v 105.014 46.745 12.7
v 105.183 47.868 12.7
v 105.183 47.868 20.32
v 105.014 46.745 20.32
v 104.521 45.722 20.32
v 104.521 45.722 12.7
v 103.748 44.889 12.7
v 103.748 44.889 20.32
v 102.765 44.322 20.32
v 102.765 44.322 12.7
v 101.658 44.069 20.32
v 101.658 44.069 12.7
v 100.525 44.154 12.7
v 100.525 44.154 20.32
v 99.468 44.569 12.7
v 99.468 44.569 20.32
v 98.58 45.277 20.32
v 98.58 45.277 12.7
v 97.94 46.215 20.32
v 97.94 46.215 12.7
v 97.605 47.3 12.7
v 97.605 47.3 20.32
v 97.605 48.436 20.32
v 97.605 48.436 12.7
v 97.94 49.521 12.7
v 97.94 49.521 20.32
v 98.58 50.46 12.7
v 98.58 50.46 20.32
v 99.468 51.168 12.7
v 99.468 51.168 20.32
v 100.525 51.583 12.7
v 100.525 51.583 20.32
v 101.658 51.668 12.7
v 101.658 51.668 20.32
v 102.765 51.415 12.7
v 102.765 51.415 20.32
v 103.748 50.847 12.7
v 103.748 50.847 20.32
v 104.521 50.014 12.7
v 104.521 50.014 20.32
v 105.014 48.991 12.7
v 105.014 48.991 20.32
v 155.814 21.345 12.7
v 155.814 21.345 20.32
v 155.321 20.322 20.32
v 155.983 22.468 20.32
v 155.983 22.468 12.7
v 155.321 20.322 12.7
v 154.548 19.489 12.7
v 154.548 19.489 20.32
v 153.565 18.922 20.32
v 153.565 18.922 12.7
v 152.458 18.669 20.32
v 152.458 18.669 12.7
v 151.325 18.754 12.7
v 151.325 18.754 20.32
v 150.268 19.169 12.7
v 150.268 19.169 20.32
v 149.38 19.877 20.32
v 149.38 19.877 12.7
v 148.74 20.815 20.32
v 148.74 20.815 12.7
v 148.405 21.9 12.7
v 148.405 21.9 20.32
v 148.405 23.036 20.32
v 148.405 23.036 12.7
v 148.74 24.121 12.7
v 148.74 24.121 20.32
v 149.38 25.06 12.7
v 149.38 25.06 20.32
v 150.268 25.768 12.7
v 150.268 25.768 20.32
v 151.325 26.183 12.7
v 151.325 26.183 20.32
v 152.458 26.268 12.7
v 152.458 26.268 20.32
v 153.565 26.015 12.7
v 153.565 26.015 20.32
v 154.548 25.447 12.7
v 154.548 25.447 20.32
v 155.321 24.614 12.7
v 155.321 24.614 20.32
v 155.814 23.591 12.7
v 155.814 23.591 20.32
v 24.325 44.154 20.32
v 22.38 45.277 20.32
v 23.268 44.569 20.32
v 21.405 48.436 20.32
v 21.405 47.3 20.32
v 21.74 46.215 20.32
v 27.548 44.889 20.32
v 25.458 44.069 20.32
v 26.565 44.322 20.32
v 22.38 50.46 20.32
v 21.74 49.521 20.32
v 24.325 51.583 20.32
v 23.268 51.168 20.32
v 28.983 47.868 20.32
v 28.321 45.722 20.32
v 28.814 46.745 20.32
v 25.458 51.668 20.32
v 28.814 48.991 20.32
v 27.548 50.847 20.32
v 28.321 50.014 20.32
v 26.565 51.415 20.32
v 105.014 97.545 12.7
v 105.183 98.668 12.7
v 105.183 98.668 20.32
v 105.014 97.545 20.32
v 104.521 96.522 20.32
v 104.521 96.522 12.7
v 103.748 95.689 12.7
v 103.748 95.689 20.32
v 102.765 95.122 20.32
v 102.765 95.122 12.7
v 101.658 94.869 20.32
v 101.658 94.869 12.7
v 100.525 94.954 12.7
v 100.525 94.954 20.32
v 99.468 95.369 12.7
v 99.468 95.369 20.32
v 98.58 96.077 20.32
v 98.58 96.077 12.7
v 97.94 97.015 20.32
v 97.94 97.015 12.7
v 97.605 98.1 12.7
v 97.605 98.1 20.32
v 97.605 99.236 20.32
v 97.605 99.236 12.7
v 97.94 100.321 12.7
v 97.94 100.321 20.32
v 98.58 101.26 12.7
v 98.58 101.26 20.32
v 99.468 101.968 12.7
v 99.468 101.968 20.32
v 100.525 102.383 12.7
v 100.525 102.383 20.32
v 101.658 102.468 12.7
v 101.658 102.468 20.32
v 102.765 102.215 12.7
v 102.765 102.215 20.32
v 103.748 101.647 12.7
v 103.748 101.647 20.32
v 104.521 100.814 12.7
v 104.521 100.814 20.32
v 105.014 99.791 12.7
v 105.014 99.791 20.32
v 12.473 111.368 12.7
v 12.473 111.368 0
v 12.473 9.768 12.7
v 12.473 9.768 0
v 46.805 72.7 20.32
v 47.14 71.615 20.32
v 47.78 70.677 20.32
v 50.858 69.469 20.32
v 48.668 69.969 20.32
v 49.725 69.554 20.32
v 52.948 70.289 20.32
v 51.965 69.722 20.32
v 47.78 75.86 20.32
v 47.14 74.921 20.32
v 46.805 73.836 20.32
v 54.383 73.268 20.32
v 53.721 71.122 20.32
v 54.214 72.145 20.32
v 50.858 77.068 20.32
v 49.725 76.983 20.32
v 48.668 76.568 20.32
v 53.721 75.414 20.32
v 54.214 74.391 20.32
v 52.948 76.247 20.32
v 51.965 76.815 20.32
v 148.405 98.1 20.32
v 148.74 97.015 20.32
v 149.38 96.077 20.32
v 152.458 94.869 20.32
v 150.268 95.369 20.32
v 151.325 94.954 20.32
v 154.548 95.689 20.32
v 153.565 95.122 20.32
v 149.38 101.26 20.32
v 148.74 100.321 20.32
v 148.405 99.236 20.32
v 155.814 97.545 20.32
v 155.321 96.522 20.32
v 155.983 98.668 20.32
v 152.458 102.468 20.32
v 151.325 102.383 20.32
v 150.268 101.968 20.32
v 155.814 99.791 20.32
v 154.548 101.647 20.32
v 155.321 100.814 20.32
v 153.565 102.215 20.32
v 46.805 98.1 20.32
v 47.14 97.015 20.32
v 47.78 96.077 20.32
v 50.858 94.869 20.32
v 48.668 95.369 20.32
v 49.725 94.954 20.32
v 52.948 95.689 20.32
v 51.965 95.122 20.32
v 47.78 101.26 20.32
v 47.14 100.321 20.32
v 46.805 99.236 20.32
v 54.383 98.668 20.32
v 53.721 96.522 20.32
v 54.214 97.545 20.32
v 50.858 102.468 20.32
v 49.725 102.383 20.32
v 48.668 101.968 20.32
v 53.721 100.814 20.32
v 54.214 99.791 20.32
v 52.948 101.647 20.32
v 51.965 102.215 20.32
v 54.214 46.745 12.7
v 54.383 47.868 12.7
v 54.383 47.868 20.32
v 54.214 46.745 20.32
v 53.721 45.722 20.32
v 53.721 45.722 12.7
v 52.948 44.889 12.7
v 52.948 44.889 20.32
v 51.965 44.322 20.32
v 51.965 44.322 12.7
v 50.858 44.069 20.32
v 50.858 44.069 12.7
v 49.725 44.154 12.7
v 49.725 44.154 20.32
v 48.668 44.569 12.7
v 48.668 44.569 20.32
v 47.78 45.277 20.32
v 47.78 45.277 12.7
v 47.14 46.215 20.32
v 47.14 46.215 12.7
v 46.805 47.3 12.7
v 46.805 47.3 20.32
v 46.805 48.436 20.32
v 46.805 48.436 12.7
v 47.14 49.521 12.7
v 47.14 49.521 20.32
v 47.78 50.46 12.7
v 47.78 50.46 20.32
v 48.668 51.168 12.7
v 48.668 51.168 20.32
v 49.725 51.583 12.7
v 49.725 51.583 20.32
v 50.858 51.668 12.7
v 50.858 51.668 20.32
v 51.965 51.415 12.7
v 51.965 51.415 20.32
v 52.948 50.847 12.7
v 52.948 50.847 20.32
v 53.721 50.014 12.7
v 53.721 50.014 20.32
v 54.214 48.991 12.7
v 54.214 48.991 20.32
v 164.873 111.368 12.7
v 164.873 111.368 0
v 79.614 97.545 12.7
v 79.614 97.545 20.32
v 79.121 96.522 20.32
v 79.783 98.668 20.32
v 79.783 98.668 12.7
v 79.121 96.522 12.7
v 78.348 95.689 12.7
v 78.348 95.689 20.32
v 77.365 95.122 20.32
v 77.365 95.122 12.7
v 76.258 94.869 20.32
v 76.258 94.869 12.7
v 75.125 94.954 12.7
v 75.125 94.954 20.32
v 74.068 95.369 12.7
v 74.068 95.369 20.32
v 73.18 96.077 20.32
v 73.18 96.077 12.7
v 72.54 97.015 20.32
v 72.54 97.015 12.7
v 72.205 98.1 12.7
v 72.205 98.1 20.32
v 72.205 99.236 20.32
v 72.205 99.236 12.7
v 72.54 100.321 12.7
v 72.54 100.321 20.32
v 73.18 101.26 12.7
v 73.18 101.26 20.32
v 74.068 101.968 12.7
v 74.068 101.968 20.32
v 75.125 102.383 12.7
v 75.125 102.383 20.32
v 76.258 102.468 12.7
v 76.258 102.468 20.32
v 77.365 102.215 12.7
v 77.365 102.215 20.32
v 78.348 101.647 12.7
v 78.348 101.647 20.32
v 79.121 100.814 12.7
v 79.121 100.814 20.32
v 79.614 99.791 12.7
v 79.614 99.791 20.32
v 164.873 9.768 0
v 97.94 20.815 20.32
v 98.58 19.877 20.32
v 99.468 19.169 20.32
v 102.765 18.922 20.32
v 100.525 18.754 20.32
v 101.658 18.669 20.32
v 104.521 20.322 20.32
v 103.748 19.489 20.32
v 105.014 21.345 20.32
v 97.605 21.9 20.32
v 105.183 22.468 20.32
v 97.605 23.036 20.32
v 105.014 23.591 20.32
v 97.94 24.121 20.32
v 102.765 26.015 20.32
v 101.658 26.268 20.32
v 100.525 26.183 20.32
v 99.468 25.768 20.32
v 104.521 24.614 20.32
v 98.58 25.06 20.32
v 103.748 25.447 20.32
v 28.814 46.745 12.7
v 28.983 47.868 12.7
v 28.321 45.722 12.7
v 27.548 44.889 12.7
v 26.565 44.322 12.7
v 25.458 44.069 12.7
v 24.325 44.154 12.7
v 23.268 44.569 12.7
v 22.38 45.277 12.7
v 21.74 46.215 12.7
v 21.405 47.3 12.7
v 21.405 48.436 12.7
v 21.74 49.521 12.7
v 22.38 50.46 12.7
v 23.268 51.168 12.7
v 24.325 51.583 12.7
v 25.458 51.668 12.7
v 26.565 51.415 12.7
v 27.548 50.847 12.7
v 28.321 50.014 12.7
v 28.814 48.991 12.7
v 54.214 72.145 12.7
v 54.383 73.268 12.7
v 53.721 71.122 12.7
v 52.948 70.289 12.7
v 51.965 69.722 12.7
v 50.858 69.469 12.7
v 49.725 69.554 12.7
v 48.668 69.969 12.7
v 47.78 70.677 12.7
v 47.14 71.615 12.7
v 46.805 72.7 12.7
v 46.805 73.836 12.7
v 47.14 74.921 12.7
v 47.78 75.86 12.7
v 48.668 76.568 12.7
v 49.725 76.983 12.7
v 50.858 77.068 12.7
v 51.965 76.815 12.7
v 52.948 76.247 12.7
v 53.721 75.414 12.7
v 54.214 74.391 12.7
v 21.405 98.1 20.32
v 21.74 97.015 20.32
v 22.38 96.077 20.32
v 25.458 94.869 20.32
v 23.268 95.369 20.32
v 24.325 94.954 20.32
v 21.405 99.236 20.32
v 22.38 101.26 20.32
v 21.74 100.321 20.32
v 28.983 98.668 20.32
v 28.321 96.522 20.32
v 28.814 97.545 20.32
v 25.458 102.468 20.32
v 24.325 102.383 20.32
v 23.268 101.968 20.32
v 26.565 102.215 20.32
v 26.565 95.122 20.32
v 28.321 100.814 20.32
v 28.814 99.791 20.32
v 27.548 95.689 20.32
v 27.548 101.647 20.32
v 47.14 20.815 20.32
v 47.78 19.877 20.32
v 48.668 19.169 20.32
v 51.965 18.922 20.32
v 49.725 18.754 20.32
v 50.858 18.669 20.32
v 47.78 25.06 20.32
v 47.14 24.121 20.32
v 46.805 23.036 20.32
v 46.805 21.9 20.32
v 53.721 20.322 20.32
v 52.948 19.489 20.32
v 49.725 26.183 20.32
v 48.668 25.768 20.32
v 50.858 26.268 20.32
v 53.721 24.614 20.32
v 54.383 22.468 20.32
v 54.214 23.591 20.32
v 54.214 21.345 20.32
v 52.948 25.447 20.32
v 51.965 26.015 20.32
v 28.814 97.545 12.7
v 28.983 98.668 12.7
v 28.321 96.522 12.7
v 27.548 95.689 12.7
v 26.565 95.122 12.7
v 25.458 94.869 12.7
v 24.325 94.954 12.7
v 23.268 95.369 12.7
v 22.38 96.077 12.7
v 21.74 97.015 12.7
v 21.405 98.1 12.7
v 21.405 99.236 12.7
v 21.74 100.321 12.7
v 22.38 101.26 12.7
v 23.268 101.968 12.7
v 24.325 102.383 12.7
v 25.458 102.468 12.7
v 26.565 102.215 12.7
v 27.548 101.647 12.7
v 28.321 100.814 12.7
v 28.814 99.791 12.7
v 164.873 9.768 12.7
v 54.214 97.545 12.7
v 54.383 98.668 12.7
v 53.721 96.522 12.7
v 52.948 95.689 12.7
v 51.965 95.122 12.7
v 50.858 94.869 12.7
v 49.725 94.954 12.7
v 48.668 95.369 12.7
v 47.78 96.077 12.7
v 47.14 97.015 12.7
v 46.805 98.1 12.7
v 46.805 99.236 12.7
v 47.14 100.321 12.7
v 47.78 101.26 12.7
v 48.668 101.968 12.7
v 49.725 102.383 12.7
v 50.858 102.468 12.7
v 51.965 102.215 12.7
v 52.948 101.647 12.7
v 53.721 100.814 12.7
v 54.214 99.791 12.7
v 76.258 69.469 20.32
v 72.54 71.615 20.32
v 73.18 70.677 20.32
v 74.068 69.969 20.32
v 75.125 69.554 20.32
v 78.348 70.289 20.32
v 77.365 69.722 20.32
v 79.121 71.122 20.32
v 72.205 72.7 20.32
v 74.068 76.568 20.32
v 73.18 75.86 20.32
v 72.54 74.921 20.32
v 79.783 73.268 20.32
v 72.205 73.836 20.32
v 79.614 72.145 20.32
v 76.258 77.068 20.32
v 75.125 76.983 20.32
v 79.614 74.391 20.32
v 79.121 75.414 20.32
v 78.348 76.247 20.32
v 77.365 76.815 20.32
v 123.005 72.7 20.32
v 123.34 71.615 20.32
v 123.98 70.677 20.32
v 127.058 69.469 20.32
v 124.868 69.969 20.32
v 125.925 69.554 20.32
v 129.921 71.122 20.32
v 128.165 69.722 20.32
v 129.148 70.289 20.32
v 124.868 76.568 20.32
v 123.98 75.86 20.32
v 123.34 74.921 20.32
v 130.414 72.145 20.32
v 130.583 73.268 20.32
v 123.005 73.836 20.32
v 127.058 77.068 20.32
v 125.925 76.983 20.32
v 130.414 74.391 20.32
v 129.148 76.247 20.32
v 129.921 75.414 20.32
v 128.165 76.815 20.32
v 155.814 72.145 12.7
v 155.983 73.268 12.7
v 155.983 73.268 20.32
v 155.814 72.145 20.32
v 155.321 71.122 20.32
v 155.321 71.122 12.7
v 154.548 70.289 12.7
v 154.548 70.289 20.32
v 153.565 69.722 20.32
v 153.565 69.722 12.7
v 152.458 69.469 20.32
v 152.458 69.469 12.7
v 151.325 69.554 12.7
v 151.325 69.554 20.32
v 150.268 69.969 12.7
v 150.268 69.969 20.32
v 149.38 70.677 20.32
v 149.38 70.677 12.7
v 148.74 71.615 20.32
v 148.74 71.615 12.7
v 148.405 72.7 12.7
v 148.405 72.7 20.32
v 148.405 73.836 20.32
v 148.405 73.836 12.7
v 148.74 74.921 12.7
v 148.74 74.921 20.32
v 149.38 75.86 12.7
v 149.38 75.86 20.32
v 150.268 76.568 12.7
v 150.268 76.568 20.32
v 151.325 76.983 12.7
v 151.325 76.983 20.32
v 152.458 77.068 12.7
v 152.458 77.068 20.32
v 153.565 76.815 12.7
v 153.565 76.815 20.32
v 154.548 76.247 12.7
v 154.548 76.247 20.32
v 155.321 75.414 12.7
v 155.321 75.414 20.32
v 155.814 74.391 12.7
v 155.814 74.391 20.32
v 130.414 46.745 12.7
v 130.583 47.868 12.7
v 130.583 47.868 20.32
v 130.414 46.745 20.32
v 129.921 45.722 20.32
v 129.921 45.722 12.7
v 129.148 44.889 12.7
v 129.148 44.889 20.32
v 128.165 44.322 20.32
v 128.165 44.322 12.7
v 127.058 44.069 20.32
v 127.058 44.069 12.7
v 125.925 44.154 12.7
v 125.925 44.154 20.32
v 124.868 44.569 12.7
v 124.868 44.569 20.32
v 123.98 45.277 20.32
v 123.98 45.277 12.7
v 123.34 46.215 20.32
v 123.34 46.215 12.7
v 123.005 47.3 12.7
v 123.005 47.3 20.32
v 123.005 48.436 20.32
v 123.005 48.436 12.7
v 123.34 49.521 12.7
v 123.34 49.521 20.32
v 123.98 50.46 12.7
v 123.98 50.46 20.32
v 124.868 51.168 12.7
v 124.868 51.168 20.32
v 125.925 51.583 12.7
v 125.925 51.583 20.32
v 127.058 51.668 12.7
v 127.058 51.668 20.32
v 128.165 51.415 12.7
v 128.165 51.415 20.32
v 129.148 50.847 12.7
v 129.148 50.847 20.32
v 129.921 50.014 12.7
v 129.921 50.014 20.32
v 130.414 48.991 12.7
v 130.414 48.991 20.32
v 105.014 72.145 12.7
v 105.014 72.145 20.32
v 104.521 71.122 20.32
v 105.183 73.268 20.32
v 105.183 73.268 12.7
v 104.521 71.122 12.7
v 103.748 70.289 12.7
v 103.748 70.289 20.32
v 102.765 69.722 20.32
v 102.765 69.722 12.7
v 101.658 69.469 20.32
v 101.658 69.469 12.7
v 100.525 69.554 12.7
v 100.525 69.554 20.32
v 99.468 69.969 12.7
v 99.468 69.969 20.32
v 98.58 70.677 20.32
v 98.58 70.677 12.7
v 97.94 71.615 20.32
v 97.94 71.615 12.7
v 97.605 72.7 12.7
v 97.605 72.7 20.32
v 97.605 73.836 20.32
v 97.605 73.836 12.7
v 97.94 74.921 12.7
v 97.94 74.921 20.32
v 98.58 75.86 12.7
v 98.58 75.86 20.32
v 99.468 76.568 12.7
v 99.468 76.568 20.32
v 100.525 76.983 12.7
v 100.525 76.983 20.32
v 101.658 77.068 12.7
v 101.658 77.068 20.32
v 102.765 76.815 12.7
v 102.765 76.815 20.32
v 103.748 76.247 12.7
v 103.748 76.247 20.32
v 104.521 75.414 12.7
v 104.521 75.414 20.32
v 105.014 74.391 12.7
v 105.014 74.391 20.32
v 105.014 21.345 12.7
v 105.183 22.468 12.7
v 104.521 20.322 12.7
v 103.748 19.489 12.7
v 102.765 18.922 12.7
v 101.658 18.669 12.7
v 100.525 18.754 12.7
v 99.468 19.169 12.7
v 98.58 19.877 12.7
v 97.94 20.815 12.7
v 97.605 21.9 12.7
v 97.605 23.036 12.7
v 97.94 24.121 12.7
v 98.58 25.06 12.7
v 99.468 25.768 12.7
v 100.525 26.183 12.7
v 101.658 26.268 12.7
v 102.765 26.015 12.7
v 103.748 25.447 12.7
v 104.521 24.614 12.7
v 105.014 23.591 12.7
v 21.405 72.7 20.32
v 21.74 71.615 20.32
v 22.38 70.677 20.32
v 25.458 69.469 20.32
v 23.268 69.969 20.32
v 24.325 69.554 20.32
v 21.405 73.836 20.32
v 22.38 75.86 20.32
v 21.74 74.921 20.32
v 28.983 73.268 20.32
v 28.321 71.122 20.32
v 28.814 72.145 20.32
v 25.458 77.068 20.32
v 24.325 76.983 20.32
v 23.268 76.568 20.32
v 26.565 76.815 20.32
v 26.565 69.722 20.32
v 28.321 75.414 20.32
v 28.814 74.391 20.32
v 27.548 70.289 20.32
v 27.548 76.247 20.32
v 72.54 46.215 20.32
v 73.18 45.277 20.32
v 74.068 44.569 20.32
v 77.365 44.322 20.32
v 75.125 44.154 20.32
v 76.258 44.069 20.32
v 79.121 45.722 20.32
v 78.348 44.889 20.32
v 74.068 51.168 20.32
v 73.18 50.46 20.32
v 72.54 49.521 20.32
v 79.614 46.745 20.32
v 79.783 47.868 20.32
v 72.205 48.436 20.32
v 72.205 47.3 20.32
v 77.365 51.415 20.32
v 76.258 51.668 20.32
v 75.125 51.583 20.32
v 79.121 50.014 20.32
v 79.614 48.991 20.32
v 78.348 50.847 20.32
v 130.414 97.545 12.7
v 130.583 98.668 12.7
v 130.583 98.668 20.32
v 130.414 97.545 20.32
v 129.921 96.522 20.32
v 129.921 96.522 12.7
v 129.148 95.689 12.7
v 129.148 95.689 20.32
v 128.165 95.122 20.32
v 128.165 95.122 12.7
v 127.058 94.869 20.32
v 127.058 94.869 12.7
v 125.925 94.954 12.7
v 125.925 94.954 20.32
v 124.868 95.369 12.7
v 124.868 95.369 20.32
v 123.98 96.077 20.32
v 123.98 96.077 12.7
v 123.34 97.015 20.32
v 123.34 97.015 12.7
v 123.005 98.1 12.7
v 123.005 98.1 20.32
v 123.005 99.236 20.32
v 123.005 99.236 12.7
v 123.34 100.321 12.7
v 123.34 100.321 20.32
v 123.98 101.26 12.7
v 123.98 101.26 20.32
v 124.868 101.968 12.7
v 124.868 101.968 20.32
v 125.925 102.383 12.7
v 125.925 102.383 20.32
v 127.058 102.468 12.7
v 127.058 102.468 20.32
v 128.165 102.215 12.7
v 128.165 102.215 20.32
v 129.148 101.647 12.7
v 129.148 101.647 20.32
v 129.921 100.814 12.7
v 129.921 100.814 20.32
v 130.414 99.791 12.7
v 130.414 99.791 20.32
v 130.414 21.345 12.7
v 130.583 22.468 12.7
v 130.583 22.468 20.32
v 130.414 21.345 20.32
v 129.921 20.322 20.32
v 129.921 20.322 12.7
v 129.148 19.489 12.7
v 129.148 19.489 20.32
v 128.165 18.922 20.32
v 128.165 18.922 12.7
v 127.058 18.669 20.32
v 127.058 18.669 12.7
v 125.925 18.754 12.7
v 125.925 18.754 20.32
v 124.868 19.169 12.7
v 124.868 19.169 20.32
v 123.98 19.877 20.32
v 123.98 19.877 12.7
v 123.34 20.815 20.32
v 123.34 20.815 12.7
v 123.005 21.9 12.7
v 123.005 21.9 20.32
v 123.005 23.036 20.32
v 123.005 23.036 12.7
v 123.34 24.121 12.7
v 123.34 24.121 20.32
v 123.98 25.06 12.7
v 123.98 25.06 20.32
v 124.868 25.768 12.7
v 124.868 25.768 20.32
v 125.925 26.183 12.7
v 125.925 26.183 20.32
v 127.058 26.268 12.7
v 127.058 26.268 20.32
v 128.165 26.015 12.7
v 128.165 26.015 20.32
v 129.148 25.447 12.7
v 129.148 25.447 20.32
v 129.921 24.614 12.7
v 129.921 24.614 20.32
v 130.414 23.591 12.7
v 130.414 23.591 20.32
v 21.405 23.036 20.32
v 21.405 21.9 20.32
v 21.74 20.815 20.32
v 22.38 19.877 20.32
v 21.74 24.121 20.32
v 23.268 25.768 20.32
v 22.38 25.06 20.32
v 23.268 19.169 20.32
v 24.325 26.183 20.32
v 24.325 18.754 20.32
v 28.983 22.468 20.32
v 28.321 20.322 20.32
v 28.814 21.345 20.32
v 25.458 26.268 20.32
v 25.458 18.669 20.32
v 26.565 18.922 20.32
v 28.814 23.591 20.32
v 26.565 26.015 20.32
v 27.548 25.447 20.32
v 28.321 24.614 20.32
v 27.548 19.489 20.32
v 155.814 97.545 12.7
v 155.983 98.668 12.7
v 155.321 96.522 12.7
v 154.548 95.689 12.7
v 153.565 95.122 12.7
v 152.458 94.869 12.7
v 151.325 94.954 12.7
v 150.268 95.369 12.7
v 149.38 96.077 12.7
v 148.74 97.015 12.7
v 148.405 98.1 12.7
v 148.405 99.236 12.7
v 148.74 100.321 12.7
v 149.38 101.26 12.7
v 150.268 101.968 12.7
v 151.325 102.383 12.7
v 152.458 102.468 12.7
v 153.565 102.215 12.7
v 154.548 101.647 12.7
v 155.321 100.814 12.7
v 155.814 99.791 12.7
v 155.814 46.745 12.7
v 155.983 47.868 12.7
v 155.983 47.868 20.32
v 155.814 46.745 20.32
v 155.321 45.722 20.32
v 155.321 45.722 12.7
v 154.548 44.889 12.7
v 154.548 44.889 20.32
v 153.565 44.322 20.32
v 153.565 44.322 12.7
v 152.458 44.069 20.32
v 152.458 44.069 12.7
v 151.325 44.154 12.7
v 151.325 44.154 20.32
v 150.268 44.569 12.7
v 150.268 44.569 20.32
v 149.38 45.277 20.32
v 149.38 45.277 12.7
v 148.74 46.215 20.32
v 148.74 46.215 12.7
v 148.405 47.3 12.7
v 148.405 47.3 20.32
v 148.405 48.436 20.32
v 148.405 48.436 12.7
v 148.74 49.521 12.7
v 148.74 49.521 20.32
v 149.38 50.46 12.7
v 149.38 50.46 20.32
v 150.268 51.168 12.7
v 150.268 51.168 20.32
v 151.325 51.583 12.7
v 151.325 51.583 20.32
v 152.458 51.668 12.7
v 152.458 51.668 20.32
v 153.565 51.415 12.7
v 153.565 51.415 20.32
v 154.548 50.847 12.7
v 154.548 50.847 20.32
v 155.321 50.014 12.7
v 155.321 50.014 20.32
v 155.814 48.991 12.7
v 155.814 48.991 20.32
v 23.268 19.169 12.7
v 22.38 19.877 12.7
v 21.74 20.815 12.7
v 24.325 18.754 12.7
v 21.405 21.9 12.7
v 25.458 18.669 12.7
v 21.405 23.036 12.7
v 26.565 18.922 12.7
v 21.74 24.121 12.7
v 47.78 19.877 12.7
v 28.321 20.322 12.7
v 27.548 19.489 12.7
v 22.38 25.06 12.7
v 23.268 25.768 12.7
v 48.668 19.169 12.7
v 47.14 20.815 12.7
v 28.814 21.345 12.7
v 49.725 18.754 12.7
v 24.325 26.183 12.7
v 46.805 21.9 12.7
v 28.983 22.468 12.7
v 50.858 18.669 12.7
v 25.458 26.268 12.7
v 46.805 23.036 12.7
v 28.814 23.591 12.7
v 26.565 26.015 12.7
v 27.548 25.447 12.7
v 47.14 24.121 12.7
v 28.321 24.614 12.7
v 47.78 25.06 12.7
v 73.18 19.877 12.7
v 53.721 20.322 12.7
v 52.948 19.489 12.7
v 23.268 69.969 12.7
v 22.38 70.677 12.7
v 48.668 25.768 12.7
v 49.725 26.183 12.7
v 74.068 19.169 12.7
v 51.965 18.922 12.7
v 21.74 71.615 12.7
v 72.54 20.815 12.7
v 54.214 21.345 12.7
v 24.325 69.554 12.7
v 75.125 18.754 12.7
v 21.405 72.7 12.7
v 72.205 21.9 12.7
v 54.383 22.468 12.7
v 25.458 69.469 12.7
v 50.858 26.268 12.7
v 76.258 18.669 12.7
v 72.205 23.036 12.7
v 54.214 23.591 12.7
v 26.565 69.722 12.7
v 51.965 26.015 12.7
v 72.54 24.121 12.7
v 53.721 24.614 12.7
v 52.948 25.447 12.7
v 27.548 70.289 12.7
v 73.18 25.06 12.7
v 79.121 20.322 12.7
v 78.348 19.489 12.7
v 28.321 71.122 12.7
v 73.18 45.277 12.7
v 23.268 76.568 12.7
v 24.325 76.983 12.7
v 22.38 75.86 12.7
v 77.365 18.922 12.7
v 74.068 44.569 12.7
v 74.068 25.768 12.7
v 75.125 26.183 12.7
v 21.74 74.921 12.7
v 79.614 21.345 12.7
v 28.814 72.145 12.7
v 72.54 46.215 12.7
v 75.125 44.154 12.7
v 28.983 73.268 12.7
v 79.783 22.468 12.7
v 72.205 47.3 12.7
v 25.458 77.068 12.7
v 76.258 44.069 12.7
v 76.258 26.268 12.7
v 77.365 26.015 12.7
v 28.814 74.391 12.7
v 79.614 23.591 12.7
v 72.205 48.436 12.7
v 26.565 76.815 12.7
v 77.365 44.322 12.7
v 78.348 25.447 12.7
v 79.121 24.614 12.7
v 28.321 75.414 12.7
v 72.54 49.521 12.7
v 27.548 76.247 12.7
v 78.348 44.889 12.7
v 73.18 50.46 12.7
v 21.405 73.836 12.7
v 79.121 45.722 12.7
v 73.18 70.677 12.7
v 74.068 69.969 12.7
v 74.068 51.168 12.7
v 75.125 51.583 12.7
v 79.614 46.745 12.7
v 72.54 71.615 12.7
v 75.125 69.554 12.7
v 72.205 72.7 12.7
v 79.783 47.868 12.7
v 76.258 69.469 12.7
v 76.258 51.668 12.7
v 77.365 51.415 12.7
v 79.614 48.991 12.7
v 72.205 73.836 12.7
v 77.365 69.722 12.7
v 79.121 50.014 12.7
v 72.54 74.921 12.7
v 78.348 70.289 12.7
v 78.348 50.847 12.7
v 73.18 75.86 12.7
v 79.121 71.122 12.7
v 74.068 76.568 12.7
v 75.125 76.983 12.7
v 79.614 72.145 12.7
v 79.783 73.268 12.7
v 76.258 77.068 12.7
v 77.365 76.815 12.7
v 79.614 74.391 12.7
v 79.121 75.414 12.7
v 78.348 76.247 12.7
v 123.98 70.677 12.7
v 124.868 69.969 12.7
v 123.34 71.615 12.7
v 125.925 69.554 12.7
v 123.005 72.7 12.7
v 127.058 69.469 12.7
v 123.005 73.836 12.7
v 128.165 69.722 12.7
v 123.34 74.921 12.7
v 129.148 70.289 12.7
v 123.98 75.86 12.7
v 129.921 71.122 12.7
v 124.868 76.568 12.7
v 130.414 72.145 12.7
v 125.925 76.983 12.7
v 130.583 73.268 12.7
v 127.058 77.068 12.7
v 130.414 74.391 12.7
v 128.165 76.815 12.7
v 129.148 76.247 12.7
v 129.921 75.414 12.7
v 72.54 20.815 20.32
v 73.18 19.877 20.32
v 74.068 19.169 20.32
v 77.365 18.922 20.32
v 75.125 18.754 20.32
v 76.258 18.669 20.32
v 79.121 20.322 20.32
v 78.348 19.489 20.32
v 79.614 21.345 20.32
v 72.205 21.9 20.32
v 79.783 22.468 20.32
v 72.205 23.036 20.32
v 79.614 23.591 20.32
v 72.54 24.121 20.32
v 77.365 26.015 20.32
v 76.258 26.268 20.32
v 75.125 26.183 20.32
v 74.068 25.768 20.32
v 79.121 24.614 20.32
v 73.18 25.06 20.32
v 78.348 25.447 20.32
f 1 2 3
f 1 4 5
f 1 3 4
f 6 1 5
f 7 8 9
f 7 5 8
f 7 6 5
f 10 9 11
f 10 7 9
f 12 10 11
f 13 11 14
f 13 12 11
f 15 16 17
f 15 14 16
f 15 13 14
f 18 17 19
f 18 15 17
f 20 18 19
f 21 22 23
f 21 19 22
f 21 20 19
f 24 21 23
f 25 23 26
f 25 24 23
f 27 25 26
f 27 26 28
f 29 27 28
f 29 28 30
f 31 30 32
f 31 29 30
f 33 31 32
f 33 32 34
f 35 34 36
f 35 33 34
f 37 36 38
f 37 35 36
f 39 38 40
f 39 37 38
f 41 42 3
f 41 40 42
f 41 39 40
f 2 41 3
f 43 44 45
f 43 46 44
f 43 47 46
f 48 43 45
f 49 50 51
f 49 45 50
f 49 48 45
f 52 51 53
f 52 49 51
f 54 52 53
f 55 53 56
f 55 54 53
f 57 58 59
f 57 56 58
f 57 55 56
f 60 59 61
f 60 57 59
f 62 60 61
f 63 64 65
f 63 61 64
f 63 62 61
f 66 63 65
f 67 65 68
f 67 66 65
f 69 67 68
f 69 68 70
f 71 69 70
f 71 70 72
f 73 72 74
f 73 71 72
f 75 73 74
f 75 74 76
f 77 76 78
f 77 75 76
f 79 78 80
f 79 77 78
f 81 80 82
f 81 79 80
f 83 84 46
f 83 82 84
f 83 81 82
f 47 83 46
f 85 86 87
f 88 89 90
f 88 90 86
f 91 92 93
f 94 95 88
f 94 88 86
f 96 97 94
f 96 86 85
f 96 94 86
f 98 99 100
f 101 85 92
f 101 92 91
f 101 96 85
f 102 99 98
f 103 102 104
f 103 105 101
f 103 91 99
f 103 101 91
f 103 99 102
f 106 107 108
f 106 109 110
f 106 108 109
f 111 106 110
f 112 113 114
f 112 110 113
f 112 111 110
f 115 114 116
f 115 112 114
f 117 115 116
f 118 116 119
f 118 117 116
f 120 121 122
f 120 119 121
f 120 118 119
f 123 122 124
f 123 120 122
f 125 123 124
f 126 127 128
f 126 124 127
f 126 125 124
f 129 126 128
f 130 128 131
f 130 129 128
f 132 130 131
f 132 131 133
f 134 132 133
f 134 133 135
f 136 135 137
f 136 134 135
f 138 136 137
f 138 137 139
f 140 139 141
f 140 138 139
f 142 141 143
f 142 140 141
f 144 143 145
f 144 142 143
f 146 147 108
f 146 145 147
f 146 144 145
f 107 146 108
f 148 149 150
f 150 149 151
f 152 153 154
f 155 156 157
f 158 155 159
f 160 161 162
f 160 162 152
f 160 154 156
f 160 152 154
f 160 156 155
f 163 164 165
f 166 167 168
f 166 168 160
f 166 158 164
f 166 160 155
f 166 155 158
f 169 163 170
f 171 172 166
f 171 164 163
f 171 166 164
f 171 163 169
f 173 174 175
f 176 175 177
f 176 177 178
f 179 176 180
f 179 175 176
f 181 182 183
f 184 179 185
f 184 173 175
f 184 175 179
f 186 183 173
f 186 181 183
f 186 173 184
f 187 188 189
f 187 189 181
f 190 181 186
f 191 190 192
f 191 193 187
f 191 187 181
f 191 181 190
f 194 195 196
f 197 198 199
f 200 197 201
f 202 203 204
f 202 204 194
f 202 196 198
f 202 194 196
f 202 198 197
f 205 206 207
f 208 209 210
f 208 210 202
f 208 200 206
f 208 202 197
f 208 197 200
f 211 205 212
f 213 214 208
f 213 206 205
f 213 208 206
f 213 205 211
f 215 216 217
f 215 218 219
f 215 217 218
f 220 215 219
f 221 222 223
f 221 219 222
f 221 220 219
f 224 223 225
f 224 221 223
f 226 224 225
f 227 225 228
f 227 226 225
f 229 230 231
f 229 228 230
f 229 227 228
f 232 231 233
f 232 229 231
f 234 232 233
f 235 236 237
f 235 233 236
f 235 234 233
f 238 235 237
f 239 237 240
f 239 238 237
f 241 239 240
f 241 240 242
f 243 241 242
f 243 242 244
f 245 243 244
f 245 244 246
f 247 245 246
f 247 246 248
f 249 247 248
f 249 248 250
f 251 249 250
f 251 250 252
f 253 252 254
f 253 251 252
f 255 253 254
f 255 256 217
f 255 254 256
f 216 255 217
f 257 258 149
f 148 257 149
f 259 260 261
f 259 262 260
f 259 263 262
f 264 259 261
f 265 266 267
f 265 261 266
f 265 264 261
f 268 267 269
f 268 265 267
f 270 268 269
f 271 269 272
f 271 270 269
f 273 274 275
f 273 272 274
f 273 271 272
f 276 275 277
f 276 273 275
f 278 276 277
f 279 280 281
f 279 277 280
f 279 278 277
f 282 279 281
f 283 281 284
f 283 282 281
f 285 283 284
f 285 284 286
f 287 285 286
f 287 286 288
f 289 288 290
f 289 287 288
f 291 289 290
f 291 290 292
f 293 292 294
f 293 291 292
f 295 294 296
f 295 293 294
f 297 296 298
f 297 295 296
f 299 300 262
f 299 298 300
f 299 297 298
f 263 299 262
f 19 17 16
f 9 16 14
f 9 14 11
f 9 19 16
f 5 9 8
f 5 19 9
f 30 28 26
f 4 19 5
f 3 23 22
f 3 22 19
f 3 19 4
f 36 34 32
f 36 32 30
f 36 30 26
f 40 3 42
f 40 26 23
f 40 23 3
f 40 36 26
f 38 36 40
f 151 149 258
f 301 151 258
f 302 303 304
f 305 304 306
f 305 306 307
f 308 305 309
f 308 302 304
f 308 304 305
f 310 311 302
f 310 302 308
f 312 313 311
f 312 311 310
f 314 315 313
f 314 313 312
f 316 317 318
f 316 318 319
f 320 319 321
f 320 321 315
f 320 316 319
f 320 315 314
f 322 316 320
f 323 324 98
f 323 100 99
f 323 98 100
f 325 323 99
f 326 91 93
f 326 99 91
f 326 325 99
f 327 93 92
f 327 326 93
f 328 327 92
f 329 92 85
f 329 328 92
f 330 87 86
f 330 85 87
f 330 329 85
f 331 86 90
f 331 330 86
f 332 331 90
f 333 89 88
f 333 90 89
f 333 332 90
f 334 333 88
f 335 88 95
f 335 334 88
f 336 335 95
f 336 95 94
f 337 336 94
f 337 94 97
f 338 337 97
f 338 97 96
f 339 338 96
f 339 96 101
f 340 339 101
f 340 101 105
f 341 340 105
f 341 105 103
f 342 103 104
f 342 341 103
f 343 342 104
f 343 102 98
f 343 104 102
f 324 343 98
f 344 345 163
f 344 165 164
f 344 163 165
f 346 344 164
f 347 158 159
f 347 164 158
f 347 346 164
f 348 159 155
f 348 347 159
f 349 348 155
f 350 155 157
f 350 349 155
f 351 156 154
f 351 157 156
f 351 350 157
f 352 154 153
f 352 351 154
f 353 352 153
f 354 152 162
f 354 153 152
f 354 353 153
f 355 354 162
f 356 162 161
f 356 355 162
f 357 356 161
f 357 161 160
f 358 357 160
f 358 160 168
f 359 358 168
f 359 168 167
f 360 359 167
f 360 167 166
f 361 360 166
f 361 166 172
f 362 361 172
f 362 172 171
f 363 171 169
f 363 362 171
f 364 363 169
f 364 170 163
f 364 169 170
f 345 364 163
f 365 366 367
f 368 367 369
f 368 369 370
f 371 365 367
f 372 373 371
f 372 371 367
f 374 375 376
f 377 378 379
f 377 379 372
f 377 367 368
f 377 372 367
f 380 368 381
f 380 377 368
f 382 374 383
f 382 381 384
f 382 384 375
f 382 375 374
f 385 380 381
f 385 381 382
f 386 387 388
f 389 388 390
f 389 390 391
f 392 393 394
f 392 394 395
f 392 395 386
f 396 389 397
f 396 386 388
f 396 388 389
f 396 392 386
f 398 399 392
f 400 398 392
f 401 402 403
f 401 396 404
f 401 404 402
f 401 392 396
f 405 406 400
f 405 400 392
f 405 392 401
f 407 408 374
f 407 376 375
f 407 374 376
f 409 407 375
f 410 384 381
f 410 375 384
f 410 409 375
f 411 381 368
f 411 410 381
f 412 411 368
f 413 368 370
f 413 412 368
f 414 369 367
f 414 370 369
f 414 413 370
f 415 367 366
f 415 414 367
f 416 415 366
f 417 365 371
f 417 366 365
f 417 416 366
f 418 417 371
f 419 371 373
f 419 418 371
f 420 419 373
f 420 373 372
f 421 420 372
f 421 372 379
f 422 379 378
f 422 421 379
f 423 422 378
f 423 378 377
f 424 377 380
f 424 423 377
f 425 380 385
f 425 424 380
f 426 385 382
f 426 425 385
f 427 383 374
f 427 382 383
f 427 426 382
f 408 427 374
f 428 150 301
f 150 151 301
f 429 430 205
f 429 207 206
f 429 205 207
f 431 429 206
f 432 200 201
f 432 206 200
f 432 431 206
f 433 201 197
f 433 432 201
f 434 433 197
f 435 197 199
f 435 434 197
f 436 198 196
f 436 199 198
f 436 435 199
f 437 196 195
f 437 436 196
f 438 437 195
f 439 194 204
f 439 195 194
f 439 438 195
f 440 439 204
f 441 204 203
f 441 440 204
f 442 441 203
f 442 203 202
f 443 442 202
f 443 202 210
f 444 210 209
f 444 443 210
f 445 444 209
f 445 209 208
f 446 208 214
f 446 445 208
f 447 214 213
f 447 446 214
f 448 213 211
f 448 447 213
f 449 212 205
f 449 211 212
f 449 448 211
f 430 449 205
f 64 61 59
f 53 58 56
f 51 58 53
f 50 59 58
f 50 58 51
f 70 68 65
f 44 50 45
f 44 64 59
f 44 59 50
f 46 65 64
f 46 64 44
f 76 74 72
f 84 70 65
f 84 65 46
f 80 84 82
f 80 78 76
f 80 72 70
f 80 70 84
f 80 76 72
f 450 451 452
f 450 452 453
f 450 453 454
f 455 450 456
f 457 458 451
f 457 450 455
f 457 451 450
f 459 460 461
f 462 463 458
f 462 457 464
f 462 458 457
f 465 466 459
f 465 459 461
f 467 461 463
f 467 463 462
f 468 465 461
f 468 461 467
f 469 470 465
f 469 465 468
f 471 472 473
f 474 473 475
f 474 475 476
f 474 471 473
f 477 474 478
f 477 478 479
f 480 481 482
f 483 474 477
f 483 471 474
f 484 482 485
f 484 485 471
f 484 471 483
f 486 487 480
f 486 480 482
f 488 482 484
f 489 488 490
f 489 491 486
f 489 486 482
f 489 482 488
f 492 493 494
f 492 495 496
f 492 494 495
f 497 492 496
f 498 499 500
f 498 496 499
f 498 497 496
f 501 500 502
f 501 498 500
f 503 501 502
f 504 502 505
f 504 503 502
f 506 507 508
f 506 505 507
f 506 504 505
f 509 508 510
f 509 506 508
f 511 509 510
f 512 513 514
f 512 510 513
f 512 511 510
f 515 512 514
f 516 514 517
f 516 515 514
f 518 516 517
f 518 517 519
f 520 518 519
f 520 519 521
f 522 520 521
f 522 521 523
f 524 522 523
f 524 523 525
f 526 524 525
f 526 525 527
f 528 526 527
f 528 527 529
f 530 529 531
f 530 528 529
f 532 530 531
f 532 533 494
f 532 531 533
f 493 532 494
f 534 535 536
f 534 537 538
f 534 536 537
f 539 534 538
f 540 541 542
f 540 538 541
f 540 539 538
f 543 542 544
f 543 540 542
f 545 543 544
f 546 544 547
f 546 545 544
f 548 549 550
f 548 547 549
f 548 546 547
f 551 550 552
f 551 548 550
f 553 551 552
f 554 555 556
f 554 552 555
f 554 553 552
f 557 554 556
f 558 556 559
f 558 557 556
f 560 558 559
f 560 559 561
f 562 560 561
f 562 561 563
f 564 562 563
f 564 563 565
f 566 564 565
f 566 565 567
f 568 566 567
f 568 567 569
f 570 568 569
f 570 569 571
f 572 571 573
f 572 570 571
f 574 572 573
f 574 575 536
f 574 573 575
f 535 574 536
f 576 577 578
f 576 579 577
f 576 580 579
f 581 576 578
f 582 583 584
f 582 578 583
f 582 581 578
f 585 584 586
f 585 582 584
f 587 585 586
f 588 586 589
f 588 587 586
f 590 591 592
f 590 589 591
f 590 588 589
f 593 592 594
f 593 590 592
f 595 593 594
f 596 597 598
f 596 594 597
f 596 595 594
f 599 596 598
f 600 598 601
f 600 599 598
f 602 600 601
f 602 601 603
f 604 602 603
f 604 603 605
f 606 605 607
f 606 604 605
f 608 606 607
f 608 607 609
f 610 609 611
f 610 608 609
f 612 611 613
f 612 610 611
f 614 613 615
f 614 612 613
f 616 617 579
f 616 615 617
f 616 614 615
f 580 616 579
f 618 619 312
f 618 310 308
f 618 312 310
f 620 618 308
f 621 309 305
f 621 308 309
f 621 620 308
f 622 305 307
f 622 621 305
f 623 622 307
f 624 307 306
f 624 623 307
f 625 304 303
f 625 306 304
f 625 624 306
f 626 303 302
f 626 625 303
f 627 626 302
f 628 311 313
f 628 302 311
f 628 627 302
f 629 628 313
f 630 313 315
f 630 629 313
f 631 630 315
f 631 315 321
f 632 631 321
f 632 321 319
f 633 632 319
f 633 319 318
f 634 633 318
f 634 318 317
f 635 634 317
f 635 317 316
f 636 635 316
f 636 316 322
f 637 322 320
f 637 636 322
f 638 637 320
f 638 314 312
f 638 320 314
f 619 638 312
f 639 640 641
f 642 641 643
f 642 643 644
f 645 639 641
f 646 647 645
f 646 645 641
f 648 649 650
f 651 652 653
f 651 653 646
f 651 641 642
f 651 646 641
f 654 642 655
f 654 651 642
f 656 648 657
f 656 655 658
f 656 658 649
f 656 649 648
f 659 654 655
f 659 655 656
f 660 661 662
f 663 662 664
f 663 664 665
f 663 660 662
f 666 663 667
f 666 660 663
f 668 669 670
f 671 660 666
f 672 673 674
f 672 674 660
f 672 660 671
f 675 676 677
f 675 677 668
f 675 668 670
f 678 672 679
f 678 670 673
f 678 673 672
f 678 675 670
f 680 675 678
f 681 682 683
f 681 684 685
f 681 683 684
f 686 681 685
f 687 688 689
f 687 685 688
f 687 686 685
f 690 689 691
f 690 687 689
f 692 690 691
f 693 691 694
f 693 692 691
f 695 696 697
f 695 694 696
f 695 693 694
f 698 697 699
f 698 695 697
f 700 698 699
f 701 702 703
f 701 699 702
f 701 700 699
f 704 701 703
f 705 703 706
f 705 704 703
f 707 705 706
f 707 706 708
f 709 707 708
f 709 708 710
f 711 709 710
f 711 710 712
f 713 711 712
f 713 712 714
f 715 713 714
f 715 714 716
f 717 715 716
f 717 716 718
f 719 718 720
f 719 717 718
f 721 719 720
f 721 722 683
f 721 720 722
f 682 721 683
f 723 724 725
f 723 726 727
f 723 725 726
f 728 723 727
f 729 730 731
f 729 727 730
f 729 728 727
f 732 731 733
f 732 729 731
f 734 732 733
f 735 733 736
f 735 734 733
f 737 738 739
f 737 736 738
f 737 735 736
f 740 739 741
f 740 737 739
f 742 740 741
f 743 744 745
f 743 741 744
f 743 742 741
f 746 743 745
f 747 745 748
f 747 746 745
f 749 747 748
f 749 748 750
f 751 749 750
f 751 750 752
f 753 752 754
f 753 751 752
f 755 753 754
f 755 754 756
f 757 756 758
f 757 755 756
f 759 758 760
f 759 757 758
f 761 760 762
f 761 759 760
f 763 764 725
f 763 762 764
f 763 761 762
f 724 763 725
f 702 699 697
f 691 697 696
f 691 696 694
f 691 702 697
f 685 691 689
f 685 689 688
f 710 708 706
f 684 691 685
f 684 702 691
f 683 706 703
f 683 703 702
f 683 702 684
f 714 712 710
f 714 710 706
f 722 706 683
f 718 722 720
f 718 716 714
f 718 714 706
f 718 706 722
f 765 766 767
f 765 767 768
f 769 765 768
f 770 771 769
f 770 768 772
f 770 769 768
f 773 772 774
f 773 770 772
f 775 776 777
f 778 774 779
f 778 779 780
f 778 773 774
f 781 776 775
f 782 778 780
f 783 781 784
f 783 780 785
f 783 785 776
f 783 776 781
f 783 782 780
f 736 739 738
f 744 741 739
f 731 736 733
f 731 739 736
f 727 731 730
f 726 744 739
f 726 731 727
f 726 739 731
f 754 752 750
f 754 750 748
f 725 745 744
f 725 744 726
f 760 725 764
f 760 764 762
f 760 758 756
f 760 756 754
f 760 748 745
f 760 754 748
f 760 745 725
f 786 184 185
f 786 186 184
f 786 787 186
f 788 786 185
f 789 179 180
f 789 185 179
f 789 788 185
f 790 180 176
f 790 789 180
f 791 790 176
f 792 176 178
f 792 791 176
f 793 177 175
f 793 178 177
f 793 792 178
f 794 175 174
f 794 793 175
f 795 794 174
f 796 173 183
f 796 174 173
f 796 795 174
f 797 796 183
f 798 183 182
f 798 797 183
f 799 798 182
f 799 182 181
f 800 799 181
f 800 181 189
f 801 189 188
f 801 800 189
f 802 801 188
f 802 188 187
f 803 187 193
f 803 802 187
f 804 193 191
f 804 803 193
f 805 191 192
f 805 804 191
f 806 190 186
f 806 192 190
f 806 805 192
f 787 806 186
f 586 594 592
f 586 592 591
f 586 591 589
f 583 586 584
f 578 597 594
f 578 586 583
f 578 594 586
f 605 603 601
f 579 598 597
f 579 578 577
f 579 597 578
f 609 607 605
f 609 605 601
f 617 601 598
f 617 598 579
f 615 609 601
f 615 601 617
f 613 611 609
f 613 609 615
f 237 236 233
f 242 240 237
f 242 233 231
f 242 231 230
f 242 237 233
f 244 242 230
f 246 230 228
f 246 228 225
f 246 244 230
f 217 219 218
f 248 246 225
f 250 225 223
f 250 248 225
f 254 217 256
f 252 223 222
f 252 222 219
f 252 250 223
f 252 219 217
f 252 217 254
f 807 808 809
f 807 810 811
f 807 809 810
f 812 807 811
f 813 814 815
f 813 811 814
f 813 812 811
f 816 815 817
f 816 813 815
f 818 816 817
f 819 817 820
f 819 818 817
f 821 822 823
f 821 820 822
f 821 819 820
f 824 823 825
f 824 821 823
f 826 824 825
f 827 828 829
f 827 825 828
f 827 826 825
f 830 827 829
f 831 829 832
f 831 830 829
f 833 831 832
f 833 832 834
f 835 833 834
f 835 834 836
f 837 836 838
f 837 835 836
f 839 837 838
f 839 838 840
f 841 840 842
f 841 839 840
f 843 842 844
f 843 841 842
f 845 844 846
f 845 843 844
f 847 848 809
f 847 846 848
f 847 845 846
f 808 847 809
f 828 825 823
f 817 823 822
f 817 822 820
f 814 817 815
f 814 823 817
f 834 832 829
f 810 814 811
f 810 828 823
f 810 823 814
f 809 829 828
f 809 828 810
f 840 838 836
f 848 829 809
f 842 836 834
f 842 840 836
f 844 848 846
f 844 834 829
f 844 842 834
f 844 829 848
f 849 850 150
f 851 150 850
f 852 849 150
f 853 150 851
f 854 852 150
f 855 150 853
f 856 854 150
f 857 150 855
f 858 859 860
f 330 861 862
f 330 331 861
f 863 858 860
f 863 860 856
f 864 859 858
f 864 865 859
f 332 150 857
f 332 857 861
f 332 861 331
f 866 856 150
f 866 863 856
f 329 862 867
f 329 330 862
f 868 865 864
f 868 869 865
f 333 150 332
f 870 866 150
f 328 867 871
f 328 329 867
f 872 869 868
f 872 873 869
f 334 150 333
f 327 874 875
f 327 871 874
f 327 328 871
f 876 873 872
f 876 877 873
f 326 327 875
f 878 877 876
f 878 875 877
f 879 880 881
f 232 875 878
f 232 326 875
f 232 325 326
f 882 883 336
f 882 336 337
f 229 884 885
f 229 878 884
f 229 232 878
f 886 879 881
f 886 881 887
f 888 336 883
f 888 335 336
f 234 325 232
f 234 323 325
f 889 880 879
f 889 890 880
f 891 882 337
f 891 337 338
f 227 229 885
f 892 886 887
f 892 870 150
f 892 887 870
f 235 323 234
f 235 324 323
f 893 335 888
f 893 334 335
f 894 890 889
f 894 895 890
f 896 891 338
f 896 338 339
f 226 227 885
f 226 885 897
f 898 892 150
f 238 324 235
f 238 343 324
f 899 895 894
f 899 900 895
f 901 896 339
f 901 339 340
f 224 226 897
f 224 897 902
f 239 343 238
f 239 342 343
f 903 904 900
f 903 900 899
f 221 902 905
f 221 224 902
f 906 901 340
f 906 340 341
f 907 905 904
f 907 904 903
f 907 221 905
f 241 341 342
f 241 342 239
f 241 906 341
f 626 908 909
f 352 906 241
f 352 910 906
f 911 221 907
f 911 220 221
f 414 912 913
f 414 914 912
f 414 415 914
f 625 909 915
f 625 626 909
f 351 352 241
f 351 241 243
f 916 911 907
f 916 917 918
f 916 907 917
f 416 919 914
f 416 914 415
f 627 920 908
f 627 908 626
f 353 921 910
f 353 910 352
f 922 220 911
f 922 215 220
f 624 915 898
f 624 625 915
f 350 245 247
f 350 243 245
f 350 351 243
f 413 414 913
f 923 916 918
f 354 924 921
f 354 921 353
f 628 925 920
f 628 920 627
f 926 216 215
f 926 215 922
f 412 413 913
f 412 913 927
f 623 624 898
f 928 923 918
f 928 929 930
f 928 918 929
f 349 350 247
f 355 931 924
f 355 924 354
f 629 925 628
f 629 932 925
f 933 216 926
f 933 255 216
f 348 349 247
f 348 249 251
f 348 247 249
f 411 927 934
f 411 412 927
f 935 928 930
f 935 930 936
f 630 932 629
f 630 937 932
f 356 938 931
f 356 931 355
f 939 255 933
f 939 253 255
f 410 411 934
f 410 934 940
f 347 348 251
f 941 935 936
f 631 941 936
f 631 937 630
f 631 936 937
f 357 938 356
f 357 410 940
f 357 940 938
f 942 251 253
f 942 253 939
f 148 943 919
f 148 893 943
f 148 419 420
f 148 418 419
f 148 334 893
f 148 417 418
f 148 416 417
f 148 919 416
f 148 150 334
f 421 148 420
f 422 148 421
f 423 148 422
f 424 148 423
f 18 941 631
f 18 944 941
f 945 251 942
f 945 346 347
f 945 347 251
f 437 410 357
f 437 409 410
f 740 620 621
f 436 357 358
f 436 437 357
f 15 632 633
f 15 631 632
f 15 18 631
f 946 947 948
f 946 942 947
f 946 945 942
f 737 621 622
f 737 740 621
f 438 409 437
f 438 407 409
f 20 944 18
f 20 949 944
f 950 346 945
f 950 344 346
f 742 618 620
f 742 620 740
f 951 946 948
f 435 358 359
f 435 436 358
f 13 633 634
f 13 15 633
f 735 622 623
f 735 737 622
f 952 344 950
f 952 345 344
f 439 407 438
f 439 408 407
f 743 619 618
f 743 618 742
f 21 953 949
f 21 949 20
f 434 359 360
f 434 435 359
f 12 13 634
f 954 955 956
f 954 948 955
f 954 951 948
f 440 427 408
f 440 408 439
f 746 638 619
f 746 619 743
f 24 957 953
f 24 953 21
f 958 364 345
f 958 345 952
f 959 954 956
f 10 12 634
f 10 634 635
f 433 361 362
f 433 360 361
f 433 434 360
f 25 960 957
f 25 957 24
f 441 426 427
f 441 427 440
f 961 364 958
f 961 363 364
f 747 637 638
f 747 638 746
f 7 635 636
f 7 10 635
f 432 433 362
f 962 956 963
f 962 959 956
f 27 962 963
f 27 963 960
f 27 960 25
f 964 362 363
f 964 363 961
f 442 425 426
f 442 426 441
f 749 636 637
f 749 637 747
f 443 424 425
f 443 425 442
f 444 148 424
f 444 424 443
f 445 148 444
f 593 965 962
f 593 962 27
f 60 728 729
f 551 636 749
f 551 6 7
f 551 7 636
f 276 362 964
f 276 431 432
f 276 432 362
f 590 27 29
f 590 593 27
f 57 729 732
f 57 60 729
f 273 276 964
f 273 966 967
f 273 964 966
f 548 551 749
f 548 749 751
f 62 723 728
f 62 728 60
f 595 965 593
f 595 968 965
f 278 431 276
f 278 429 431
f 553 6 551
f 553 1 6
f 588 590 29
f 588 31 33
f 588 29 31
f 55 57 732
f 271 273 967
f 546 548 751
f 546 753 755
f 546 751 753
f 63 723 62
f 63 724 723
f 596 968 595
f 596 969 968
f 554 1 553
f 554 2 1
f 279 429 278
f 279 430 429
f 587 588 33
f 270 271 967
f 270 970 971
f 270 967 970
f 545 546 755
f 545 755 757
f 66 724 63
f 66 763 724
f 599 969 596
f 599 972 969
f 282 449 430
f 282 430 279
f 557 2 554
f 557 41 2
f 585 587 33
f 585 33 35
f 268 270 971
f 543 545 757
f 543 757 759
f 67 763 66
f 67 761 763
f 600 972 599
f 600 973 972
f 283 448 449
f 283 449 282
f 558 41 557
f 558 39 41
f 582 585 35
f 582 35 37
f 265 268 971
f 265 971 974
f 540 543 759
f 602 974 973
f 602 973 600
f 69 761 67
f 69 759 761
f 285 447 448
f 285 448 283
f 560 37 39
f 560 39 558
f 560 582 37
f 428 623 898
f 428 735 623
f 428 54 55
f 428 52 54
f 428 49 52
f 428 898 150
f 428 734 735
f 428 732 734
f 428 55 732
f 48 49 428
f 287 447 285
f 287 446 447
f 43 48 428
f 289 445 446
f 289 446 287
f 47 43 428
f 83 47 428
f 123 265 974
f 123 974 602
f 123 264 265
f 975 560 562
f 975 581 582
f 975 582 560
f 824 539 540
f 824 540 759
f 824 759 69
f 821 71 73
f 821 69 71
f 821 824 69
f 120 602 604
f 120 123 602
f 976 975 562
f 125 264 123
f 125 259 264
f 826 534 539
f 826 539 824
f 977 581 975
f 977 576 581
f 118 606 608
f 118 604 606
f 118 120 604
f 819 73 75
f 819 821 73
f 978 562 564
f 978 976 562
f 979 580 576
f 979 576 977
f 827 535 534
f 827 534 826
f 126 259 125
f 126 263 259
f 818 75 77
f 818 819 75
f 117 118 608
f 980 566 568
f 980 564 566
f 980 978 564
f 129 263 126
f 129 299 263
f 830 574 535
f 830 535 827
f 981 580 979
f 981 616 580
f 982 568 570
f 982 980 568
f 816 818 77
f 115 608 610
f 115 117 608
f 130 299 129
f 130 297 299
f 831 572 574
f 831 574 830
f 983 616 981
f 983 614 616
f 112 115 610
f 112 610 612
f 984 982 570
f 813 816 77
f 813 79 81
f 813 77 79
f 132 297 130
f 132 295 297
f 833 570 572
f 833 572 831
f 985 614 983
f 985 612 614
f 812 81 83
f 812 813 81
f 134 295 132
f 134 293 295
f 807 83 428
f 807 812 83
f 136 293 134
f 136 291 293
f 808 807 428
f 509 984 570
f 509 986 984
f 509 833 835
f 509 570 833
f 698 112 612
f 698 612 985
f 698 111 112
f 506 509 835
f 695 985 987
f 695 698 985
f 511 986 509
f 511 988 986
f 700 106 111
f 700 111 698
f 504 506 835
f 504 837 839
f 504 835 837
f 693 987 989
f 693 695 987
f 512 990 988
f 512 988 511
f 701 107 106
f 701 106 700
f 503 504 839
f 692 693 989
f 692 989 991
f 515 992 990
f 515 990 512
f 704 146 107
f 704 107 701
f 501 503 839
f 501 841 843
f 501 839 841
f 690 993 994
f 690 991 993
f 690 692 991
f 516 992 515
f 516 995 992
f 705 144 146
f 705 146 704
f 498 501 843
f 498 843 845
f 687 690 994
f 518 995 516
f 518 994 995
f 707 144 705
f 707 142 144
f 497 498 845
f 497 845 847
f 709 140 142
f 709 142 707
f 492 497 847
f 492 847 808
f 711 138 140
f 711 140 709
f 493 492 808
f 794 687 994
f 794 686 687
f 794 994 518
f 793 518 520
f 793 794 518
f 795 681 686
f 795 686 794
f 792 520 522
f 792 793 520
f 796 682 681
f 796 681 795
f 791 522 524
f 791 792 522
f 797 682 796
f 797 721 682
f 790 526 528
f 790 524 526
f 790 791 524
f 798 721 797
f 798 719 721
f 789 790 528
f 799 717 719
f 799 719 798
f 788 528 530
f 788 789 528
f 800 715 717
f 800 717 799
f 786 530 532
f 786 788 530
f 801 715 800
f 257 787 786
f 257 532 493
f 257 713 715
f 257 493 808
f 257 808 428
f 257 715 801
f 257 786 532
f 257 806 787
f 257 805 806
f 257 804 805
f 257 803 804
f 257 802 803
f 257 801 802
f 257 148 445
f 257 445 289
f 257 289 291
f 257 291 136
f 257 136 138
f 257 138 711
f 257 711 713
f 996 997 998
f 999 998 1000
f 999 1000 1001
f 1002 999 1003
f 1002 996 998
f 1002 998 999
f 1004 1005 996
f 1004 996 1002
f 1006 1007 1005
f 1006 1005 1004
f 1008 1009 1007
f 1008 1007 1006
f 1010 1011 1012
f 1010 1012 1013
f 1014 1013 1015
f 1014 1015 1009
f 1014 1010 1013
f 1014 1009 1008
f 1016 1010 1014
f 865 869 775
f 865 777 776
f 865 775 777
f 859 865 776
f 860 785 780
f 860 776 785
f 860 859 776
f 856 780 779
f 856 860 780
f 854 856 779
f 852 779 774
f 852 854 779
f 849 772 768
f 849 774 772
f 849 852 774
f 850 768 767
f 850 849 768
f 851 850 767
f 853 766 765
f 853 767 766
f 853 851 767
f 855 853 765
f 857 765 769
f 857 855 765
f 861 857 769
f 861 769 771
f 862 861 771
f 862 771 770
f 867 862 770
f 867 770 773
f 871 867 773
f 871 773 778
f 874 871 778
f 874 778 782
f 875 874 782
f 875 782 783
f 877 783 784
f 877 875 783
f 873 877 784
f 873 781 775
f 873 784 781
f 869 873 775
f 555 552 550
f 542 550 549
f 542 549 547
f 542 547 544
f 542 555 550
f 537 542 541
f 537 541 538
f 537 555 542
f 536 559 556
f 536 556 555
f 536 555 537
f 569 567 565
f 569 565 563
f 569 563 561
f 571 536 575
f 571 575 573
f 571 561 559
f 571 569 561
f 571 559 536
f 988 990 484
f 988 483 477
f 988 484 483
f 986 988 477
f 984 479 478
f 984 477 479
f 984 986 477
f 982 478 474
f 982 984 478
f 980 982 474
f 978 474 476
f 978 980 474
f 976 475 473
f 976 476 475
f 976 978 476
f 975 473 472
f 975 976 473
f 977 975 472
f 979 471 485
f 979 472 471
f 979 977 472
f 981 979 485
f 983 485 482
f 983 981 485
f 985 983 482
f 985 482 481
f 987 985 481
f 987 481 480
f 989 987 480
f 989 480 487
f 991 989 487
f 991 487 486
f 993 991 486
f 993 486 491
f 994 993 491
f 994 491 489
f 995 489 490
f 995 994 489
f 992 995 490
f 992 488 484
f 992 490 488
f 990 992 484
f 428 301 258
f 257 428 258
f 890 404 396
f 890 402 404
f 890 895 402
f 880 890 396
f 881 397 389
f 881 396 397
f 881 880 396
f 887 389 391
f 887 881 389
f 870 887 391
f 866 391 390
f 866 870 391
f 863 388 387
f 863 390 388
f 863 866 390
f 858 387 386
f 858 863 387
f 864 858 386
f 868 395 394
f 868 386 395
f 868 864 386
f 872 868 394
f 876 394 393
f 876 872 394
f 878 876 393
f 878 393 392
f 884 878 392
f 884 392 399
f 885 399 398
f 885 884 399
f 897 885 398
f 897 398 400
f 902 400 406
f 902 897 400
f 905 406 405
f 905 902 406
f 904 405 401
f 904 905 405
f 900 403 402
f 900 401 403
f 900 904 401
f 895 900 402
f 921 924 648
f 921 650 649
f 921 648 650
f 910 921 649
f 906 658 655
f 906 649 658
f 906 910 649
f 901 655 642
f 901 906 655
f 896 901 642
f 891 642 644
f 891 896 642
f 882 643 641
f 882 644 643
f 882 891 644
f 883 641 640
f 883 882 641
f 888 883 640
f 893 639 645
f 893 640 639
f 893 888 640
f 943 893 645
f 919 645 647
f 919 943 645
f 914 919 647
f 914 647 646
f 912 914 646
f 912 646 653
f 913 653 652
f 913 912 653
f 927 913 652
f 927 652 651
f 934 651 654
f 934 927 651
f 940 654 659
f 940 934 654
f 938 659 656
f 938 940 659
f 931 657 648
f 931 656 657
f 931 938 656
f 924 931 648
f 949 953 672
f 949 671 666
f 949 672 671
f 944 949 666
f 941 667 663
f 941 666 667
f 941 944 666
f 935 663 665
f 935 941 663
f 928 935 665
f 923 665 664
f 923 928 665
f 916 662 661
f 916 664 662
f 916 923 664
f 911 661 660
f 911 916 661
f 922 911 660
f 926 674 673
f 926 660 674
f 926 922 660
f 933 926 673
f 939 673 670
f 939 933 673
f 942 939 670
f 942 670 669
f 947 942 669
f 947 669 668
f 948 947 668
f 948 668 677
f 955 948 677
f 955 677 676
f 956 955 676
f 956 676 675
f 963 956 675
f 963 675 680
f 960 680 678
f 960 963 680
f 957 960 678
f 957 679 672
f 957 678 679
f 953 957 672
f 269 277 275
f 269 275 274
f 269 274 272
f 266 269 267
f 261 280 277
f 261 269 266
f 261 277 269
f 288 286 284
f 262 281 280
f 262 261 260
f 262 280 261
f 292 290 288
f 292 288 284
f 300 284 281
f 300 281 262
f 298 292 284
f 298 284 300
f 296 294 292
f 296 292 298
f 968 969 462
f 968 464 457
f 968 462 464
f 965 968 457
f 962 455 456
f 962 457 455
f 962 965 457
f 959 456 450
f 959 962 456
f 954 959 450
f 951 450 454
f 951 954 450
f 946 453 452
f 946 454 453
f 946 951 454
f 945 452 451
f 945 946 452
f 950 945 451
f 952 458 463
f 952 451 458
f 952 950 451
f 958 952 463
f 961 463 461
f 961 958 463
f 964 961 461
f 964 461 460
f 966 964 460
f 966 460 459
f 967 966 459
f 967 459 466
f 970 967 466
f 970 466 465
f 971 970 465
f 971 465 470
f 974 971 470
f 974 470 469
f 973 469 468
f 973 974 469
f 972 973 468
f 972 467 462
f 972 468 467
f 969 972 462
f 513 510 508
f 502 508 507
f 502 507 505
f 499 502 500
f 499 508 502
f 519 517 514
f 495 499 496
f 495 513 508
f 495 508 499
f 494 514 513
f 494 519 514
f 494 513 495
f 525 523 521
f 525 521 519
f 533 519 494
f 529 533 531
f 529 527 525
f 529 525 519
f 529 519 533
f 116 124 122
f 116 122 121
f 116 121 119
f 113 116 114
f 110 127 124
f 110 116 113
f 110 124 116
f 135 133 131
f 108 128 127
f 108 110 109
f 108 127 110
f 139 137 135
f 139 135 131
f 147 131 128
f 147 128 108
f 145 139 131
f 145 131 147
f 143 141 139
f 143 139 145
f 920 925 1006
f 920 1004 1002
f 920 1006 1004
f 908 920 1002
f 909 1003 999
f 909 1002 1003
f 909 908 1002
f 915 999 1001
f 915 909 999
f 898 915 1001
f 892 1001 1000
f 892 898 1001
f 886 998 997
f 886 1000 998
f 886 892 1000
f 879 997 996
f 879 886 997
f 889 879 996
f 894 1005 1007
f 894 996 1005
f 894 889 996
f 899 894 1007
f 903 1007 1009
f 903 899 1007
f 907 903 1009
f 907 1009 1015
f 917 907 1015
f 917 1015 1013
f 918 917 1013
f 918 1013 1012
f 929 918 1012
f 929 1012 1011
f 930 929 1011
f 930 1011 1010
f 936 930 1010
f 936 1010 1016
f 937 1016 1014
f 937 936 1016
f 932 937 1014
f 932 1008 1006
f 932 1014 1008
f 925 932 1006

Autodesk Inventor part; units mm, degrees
ref_plane "YZ Plane" through (0, 0, 0) normal (1, 0, 0) x (0, 1, 0)
ref_plane "XZ Plane" through (0, 0, 0) normal (0, 1, 0) x (-1, 0, 0)
ref_plane "XY Plane" through (0, 0, 0) normal (0, 0, 1) x (1, 0, 0)
sketch "Sketch1" plane through (0, 0, 0) normal (0, 0, 1) x (1, 0, 0)
  line L0 (12.4728, 9.7682) -> (164.8728, 9.7682)
  line L1 (164.8728, 9.7682) -> (164.8728, 111.3682)
  line L2 (164.8728, 111.3682) -> (12.4728, 111.3682)
  line L3 (12.4728, 111.3682) -> (12.4728, 9.7682)
  point P0 (0, 0)
  dimension "d0" = 152.4
  dimension "d1" = 101.6
extrude "Extrusion1" add sketch "Sketch1" along normal blind 12.7
sketch "Sketch2" plane through (0, 0, 12.7) normal (0, 0, 1) x (1, 0, 0)
  circle A0 centre (25.1728, 22.4682) radius 3.81
  line L0 (12.4728, 111.3682) -> (12.4728, 9.7682) projected
  line L1 (12.4728, 9.7682) -> (164.8728, 9.7682) projected
  circle A1 centre (25.1728, 47.8682) radius 3.81
  circle A2 centre (25.1728, 73.2682) radius 3.81
  circle A3 centre (25.1728, 98.6682) radius 3.81
  circle A4 centre (50.5728, 22.4682) radius 3.81
  circle A5 centre (50.5728, 47.8682) radius 3.81
  circle A6 centre (50.5728, 73.2682) radius 3.81
  circle A7 centre (50.5728, 98.6682) radius 3.81
  circle A8 centre (75.9728, 22.4682) radius 3.81
  circle A9 centre (75.9728, 47.8682) radius 3.81
  circle A10 centre (75.9728, 73.2682) radius 3.81
  circle A11 centre (75.9728, 98.6682) radius 3.81
  circle A12 centre (101.3728, 22.4682) radius 3.81
  circle A13 centre (101.3728, 47.8682) radius 3.81
  circle A14 centre (101.3728, 73.2682) radius 3.81
  circle A15 centre (101.3728, 98.6682) radius 3.81
  circle A16 centre (126.7728, 22.4682) radius 3.81
  circle A17 centre (126.7728, 47.8682) radius 3.81
  circle A18 centre (126.7728, 73.2682) radius 3.81
  circle A19 centre (126.7728, 98.6682) radius 3.81
  circle A20 centre (152.1728, 22.4682) radius 3.81
  circle A21 centre (152.1728, 47.8682) radius 3.81
  circle A22 centre (152.1728, 73.2682) radius 3.81
  circle A23 centre (152.1728, 98.6682) radius 3.81
  point P0 (0, 0)
  dimension "d4" = 7.62
  dimension "d5" = 12.7
  dimension "d6" = 12.7
  dimension "d9" = 25.4
  dimension "d12" = 25.4
extrude "Extrusion2" add sketch "Sketch2" along normal blind 7.62
properties part number "p"
